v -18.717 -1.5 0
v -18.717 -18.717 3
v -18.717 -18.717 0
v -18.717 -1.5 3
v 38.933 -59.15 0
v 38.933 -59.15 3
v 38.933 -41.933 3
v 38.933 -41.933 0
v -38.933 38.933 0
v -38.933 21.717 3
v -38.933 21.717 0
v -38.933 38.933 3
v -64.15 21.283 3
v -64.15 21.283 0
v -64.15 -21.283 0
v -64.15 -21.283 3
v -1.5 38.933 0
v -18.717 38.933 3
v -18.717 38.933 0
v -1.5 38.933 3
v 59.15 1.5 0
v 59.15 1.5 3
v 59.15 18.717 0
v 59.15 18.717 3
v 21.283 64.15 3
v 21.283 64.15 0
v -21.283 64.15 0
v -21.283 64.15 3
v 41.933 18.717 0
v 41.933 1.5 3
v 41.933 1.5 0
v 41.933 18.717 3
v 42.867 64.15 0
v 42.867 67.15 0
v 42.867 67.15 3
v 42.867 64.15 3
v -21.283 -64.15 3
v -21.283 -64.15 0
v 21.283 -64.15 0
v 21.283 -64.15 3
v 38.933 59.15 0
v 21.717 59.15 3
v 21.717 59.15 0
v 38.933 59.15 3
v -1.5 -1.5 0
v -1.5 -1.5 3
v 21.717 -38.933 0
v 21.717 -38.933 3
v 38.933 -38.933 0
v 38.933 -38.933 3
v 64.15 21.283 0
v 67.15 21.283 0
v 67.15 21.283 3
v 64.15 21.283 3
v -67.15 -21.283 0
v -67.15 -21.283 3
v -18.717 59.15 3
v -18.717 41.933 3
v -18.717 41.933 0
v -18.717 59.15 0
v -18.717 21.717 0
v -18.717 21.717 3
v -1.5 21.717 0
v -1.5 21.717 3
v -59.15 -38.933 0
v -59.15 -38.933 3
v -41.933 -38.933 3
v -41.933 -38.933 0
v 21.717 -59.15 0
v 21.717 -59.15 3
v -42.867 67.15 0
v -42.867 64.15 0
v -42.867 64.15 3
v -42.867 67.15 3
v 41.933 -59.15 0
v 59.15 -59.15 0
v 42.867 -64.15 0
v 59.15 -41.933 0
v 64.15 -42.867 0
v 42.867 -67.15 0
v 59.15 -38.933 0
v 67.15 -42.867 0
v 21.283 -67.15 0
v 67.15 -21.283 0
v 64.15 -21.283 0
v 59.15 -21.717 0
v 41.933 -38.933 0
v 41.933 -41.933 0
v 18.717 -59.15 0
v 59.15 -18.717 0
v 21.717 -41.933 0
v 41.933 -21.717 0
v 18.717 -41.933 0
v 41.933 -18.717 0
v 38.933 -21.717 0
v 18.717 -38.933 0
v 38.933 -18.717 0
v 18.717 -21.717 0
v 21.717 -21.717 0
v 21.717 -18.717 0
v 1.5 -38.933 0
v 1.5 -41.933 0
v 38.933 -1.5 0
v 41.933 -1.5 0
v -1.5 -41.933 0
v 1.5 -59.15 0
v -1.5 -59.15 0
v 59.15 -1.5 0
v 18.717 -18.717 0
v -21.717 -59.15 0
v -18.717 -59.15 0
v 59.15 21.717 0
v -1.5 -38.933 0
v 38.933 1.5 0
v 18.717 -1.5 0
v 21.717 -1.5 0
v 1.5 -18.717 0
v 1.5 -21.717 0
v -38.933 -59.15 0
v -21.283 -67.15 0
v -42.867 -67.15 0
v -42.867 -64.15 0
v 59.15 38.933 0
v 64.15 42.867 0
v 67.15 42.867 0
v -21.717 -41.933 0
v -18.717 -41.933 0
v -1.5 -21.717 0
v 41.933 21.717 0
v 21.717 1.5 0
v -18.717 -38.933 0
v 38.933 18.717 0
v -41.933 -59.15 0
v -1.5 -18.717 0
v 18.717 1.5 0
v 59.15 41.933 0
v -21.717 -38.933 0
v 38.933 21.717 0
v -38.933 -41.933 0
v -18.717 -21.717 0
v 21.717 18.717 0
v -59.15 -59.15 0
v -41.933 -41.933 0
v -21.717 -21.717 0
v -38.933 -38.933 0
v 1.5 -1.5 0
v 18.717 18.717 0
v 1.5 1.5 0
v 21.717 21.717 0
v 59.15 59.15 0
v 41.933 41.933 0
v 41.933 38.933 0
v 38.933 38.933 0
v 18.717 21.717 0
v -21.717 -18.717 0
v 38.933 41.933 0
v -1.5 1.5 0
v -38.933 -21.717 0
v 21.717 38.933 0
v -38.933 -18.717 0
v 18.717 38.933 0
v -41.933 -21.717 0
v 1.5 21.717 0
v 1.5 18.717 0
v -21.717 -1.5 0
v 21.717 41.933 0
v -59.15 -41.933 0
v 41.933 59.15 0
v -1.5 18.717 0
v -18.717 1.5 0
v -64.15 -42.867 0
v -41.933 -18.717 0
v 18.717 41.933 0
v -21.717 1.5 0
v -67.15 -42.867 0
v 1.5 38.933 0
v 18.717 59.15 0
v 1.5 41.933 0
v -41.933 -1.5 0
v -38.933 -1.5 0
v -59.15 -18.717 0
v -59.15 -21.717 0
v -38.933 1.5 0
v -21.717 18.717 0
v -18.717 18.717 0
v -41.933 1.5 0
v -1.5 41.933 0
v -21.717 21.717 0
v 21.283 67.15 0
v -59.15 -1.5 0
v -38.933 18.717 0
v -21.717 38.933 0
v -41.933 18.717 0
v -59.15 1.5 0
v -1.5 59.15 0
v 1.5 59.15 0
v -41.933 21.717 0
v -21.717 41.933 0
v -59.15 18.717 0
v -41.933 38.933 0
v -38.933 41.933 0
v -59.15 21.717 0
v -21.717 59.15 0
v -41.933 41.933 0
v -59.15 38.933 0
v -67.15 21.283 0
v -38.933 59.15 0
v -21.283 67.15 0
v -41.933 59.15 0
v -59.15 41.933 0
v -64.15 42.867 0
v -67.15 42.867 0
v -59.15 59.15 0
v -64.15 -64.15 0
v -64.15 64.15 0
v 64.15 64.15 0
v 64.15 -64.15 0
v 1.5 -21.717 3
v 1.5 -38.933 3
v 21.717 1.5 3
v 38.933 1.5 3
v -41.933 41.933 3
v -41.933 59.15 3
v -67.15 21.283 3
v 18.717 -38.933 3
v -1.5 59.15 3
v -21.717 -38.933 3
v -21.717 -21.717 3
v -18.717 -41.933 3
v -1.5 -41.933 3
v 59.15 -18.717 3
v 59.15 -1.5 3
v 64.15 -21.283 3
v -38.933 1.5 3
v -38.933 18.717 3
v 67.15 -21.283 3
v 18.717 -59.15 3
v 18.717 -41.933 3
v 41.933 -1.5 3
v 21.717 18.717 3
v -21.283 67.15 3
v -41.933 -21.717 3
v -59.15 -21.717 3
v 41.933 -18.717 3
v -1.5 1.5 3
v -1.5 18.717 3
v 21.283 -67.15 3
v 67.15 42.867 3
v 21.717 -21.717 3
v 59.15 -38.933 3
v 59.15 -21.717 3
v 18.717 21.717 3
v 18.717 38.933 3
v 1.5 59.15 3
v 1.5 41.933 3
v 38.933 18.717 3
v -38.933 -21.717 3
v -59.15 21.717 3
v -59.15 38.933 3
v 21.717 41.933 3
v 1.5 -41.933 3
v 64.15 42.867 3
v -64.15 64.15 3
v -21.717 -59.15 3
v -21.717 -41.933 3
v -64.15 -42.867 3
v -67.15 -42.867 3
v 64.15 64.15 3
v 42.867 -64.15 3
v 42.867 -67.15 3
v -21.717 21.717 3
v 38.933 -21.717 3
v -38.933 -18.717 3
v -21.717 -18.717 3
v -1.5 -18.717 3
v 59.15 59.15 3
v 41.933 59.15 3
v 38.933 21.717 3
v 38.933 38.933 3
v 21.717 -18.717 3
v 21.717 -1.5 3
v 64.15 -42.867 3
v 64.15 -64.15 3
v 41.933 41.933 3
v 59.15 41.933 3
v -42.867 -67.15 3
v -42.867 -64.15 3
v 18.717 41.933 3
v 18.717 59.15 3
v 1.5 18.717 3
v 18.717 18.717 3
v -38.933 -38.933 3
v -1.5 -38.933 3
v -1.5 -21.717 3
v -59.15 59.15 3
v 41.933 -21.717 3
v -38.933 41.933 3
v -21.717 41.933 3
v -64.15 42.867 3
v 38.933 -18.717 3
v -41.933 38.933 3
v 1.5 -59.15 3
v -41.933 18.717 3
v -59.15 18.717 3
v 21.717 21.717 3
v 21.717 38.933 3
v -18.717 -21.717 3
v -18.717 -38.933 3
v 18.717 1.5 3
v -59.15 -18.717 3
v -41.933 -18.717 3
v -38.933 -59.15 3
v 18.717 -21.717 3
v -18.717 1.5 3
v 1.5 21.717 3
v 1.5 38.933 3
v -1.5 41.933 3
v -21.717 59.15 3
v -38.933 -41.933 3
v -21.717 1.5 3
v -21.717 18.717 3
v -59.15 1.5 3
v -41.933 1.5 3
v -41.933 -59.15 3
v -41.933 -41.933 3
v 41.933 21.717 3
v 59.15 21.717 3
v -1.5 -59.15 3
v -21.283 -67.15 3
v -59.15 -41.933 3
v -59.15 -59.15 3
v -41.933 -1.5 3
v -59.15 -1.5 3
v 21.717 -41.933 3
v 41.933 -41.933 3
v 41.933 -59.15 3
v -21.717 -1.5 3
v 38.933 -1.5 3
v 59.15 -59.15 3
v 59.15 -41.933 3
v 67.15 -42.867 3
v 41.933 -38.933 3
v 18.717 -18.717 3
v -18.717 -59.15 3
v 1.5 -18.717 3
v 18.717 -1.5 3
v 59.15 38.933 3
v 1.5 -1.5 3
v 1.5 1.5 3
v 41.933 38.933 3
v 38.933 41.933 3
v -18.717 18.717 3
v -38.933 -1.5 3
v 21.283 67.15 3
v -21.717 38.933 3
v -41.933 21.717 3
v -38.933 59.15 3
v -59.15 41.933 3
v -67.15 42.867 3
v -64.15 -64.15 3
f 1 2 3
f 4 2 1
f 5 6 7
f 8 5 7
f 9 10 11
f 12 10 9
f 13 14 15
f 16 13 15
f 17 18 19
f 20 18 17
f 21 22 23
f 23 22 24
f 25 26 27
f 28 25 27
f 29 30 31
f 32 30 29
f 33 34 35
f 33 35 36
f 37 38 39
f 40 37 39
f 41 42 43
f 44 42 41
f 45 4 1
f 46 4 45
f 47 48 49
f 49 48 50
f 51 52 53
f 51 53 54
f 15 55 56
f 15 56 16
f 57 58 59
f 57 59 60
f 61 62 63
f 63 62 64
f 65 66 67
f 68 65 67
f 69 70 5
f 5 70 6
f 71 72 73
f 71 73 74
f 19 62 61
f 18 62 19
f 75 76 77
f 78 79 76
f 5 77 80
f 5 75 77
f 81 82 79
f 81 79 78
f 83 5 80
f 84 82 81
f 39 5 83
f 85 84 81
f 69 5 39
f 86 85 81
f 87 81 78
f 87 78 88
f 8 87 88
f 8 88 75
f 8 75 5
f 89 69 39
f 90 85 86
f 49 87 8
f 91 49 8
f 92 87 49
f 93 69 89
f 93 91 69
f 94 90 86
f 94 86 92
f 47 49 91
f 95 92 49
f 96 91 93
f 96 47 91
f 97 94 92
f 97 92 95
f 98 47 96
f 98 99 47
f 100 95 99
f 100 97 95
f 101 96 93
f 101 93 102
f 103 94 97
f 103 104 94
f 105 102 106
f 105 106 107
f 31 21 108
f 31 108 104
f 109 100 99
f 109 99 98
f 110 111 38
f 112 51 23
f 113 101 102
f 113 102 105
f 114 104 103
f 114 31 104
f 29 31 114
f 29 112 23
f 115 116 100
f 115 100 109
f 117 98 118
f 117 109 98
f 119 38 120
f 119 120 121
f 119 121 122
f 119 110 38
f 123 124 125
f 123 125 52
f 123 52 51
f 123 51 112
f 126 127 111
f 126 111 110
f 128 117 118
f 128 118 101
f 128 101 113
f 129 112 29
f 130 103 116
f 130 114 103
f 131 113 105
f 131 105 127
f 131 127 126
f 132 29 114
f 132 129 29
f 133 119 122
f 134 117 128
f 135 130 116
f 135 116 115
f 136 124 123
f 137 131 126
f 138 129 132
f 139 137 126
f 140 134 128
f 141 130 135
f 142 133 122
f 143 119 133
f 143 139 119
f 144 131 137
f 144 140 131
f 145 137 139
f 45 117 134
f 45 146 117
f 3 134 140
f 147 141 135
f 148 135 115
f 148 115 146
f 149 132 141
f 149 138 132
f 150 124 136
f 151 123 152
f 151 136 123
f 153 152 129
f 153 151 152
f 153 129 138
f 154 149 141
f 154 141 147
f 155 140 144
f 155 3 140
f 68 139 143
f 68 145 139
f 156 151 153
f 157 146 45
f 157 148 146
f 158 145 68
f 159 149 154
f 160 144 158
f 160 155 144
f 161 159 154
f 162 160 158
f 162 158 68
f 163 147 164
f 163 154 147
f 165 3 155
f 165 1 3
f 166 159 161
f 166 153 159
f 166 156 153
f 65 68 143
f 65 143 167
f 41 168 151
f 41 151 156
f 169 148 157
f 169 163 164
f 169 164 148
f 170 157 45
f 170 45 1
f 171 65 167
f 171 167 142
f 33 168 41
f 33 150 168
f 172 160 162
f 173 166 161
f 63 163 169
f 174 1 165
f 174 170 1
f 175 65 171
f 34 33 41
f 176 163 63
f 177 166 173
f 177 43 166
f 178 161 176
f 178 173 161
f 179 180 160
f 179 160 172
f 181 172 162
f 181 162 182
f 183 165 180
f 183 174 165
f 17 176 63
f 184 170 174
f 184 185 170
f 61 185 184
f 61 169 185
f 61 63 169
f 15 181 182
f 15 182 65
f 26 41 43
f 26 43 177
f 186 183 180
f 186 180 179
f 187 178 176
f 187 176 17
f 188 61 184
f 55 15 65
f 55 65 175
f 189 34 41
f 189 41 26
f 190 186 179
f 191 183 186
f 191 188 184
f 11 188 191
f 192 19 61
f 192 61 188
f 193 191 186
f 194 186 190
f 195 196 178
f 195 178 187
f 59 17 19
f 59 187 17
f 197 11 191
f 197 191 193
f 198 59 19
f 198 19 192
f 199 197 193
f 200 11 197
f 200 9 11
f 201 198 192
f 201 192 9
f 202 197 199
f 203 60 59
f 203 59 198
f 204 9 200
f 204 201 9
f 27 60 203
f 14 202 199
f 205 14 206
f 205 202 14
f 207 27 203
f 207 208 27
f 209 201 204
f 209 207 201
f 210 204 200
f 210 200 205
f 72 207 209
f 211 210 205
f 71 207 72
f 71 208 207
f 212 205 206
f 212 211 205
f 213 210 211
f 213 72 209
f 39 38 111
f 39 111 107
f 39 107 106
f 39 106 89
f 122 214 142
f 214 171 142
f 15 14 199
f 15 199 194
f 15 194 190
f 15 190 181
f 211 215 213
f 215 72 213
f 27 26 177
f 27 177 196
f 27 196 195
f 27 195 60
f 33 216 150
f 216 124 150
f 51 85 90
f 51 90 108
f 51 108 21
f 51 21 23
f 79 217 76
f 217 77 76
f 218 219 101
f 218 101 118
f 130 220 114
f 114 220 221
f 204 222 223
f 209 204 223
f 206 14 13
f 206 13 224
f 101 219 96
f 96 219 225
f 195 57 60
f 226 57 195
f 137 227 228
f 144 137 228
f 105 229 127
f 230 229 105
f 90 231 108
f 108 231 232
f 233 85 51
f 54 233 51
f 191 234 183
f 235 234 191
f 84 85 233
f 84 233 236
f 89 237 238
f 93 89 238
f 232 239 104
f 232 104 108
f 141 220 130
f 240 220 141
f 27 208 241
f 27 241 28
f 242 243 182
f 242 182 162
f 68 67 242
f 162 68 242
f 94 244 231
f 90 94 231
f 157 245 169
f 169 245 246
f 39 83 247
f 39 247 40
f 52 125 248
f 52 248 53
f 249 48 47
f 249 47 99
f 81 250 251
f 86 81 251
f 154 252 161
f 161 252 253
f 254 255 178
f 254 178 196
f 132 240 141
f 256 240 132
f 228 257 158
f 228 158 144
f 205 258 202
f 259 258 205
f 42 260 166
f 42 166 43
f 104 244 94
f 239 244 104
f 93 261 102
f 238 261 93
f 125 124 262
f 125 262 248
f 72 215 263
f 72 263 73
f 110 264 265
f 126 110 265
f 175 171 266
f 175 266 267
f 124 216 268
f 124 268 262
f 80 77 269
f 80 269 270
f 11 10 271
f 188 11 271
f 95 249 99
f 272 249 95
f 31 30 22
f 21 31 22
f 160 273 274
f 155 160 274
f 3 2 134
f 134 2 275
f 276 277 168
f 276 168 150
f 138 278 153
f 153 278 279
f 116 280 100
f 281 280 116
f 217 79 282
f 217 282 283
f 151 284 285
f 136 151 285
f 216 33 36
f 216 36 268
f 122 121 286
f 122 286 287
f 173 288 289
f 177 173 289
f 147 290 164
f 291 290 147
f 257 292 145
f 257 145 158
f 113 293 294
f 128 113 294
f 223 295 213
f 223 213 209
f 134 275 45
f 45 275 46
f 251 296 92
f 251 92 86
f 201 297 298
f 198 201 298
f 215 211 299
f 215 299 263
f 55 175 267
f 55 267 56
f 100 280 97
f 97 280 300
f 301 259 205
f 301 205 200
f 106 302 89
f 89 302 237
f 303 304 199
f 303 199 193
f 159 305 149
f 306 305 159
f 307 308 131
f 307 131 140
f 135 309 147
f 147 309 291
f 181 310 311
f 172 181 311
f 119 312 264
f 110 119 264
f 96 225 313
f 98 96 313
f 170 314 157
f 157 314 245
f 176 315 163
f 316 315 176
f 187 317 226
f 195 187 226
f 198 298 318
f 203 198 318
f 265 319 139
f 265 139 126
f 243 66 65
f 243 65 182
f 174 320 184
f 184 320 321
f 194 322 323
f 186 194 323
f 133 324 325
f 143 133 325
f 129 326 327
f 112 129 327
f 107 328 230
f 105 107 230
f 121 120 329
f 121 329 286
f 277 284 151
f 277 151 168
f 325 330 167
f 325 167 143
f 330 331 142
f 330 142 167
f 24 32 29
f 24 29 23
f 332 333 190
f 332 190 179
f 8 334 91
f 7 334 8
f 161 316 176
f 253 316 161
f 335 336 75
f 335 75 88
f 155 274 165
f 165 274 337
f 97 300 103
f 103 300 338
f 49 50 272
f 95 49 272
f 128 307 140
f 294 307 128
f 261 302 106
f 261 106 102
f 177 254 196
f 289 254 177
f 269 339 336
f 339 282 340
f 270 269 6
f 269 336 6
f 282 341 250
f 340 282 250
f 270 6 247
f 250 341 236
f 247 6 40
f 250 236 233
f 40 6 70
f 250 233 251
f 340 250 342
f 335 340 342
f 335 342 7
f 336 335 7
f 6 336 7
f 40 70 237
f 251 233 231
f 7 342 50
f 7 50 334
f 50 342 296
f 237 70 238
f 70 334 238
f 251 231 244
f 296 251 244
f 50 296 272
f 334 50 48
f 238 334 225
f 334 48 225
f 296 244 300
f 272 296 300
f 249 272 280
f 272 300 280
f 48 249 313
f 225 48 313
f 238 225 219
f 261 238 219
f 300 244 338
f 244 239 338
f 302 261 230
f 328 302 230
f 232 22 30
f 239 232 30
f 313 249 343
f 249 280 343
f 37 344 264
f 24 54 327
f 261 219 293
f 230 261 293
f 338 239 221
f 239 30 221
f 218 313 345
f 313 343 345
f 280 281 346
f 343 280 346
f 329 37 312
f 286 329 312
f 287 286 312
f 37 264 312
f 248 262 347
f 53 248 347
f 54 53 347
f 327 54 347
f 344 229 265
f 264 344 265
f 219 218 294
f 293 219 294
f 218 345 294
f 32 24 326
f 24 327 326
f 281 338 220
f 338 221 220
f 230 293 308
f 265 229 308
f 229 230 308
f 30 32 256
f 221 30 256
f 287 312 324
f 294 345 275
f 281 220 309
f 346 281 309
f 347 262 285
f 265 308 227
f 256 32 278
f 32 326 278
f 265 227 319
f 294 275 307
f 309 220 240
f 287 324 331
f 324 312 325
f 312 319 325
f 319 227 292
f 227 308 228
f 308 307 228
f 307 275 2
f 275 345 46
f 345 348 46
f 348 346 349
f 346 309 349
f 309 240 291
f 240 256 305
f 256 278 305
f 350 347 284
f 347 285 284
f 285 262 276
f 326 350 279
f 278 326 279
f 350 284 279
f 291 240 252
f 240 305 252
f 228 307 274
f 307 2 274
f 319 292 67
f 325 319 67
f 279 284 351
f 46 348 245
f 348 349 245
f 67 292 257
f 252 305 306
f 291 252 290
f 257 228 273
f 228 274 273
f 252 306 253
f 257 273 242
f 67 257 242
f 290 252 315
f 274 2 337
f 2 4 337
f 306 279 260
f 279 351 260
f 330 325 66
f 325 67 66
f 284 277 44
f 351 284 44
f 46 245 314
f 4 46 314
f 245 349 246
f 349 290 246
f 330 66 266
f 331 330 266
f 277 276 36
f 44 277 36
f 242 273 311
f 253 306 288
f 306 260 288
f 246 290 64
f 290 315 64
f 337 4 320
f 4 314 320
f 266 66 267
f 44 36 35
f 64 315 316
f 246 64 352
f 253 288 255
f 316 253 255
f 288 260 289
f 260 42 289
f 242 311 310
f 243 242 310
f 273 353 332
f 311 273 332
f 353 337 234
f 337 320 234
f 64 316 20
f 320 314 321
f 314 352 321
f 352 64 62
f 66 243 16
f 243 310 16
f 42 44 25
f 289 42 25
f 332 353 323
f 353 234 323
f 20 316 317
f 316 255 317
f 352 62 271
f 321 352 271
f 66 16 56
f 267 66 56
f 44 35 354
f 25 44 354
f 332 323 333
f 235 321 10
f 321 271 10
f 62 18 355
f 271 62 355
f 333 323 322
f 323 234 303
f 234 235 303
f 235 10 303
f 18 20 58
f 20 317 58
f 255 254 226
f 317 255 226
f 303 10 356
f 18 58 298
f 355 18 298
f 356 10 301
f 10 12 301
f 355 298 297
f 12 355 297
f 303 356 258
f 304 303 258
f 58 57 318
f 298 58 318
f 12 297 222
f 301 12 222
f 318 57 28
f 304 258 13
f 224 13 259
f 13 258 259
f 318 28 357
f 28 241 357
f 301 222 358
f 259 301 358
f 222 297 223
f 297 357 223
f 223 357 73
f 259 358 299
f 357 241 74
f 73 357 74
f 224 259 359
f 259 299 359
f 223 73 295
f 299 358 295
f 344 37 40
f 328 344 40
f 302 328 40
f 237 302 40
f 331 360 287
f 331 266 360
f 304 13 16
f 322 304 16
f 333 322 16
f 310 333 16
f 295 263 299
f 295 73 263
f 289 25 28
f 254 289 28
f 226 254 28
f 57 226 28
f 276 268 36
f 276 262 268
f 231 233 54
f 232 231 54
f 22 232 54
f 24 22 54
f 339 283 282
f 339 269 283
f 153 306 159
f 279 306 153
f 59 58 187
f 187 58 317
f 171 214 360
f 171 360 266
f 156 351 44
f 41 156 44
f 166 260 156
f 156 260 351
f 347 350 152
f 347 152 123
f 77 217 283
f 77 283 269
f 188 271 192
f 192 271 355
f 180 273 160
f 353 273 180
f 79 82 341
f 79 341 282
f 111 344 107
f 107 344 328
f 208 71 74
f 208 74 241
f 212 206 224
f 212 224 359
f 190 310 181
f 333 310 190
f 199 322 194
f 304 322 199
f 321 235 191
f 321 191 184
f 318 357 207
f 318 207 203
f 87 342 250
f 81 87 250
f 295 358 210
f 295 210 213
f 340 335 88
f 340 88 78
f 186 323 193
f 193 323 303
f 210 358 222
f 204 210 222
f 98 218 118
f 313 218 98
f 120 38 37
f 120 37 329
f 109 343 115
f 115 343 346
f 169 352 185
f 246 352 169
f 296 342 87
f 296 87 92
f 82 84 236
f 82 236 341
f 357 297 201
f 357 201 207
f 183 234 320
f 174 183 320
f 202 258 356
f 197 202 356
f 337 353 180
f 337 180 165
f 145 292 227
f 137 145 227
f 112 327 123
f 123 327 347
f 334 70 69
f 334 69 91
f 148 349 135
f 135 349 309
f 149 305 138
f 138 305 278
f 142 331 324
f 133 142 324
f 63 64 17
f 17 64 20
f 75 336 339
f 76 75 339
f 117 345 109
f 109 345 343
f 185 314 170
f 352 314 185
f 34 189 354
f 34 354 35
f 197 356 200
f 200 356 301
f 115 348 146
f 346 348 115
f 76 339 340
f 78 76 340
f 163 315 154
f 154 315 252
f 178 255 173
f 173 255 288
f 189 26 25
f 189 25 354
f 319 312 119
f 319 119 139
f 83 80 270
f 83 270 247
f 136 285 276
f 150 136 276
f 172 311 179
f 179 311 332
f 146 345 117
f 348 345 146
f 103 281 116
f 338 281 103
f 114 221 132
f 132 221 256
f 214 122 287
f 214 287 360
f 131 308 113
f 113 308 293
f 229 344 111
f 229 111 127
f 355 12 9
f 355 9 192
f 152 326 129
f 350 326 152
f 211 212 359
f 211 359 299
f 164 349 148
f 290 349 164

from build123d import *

# Parameters (mm, degrees)
BOSS_EXTRUDE1_DEPTH = 3
SKETCH2_W           = 17.216666667
SKETCH2_H           = 17.216666667
SKETCH2_W_2         = 17.216666666
SKETCH2_H_2         = 17.216666666
CUT_EXTRUDE1_DEPTH  = 96.011815055


with BuildPart() as part:
    # Sketch1 → Boss-Extrude1 (new body)
    with BuildSketch(Plane.XY):
        Polygon((0, -64.15), (-21.283333333, -64.15), (-21.283333333, -67.15), (-42.866666667, -67.15), (-42.866666667, -64.15), (-64.15, -64.15), (-64.15, -42.866666667), (-67.15, -42.866666667), (-67.15, -21.283333333), (-64.15, -21.283333333), (-64.15, 0), (-64.15, 21.283333333), (-67.15, 21.283333333), (-67.15, 42.866666667), (-64.15, 42.866666667), (-64.15, 64.15), (-42.866666667, 64.15), (-42.866666667, 67.15), (-21.283333333, 67.15), (-21.283333333, 64.15), (0, 64.15), (21.283333333, 64.15), (21.283333333, 67.15), (42.866666667, 67.15), (42.866666667, 64.15), (64.15, 64.15), (64.15, 42.866666667), (67.15, 42.866666667), (67.15, 21.283333333), (64.15, 21.283333333), (64.15, 0), (64.15, -21.283333333), (67.15, -21.283333333), (67.15, -42.866666667), (64.15, -42.866666667), (64.15, -64.15), (42.866666667, -64.15), (42.866666667, -67.15), (21.283333333, -67.15), (21.283333333, -64.15), align=None)
    extrude(amount=BOSS_EXTRUDE1_DEPTH)

    # Sketch2 → Cut-Extrude1 (cut, through all)
    with BuildSketch(Plane.XY.offset(3)):
        with Locations((-50.541666667, 50.541666667)):
            Rectangle(SKETCH2_W, SKETCH2_H)
        with Locations((-30.325, 50.541666667)):
            Rectangle(SKETCH2_W_2, SKETCH2_H)
        with Locations((-10.108333334, 50.541666667)):
            Rectangle(SKETCH2_W, SKETCH2_H)
        with Locations((10.108333334, 50.541666667)):
            Rectangle(SKETCH2_W, SKETCH2_H)
        with Locations((30.325, 50.541666667)):
            Rectangle(SKETCH2_W_2, SKETCH2_H)
        with Locations((50.541666667, 50.541666667)):
            Rectangle(SKETCH2_W, SKETCH2_H)
        with Locations((-30.325, 30.325)):
            Rectangle(SKETCH2_W_2, SKETCH2_H_2)
        with Locations((-10.108333334, 30.325)):
            Rectangle(SKETCH2_W, SKETCH2_H_2)
        with Locations((10.108333334, 30.325)):
            Rectangle(SKETCH2_W, SKETCH2_H_2)
        with Locations((30.325, 30.325)):
            Rectangle(SKETCH2_W_2, SKETCH2_H_2)
        with Locations((50.541666667, 30.325)):
            Rectangle(SKETCH2_W, SKETCH2_H_2)
        with Locations((-30.325, 10.108333334)):
            Rectangle(SKETCH2_W_2, SKETCH2_H)
        with Locations((-10.108333334, 10.108333334)):
            Rectangle(SKETCH2_W, SKETCH2_H)
        with Locations((10.108333334, 10.108333334)):
            Rectangle(SKETCH2_W, SKETCH2_H)
        with Locations((30.325, 10.108333334)):
            Rectangle(SKETCH2_W_2, SKETCH2_H)
        with Locations((50.541666667, 10.108333334)):
            Rectangle(SKETCH2_W, SKETCH2_H)
        with Locations((-30.325, -10.108333334)):
            Rectangle(SKETCH2_W_2, SKETCH2_H)
        with Locations((-10.108333334, -10.108333334)):
            Rectangle(SKETCH2_W, SKETCH2_H)
        with Locations((10.108333334, -10.108333334)):
            Rectangle(SKETCH2_W, SKETCH2_H)
        with Locations((30.325, -10.108333334)):
            Rectangle(SKETCH2_W_2, SKETCH2_H)
        with Locations((50.541666667, -10.108333334)):
            Rectangle(SKETCH2_W, SKETCH2_H)
        with Locations((-30.325, -30.325)):
            Rectangle(SKETCH2_W_2, SKETCH2_H_2)
        with Locations((-10.108333334, -30.325)):
            Rectangle(SKETCH2_W, SKETCH2_H_2)
        with Locations((10.108333334, -30.325)):
            Rectangle(SKETCH2_W, SKETCH2_H_2)
        with Locations((30.325, -30.325)):
            Rectangle(SKETCH2_W_2, SKETCH2_H_2)
        with Locations((50.541666667, -30.325)):
            Rectangle(SKETCH2_W, SKETCH2_H_2)
        with Locations((-30.325, -50.541666667)):
            Rectangle(SKETCH2_W_2, SKETCH2_H)
        with Locations((-10.108333334, -50.541666667)):
            Rectangle(SKETCH2_W, SKETCH2_H)
        with Locations((10.108333334, -50.541666667)):
            Rectangle(SKETCH2_W, SKETCH2_H)
        with Locations((30.325, -50.541666667)):
            Rectangle(SKETCH2_W_2, SKETCH2_H)
        with Locations((50.541666667, -50.541666667)):
            Rectangle(SKETCH2_W, SKETCH2_H)
        with Locations((-50.541666667, 30.325)):
            Rectangle(SKETCH2_W, SKETCH2_H_2)
        with Locations((-50.541666667, 10.108333334)):
            Rectangle(SKETCH2_W, SKETCH2_H)
        with Locations((-50.541666667, -10.108333334)):
            Rectangle(SKETCH2_W, SKETCH2_H)
        with Locations((-50.541666667, -30.325)):
            Rectangle(SKETCH2_W, SKETCH2_H_2)
        with Locations((-50.541666667, -50.541666667)):
            Rectangle(SKETCH2_W, SKETCH2_H)
    extrude(amount=-CUT_EXTRUDE1_DEPTH, mode=Mode.SUBTRACT)


solid = part.part
